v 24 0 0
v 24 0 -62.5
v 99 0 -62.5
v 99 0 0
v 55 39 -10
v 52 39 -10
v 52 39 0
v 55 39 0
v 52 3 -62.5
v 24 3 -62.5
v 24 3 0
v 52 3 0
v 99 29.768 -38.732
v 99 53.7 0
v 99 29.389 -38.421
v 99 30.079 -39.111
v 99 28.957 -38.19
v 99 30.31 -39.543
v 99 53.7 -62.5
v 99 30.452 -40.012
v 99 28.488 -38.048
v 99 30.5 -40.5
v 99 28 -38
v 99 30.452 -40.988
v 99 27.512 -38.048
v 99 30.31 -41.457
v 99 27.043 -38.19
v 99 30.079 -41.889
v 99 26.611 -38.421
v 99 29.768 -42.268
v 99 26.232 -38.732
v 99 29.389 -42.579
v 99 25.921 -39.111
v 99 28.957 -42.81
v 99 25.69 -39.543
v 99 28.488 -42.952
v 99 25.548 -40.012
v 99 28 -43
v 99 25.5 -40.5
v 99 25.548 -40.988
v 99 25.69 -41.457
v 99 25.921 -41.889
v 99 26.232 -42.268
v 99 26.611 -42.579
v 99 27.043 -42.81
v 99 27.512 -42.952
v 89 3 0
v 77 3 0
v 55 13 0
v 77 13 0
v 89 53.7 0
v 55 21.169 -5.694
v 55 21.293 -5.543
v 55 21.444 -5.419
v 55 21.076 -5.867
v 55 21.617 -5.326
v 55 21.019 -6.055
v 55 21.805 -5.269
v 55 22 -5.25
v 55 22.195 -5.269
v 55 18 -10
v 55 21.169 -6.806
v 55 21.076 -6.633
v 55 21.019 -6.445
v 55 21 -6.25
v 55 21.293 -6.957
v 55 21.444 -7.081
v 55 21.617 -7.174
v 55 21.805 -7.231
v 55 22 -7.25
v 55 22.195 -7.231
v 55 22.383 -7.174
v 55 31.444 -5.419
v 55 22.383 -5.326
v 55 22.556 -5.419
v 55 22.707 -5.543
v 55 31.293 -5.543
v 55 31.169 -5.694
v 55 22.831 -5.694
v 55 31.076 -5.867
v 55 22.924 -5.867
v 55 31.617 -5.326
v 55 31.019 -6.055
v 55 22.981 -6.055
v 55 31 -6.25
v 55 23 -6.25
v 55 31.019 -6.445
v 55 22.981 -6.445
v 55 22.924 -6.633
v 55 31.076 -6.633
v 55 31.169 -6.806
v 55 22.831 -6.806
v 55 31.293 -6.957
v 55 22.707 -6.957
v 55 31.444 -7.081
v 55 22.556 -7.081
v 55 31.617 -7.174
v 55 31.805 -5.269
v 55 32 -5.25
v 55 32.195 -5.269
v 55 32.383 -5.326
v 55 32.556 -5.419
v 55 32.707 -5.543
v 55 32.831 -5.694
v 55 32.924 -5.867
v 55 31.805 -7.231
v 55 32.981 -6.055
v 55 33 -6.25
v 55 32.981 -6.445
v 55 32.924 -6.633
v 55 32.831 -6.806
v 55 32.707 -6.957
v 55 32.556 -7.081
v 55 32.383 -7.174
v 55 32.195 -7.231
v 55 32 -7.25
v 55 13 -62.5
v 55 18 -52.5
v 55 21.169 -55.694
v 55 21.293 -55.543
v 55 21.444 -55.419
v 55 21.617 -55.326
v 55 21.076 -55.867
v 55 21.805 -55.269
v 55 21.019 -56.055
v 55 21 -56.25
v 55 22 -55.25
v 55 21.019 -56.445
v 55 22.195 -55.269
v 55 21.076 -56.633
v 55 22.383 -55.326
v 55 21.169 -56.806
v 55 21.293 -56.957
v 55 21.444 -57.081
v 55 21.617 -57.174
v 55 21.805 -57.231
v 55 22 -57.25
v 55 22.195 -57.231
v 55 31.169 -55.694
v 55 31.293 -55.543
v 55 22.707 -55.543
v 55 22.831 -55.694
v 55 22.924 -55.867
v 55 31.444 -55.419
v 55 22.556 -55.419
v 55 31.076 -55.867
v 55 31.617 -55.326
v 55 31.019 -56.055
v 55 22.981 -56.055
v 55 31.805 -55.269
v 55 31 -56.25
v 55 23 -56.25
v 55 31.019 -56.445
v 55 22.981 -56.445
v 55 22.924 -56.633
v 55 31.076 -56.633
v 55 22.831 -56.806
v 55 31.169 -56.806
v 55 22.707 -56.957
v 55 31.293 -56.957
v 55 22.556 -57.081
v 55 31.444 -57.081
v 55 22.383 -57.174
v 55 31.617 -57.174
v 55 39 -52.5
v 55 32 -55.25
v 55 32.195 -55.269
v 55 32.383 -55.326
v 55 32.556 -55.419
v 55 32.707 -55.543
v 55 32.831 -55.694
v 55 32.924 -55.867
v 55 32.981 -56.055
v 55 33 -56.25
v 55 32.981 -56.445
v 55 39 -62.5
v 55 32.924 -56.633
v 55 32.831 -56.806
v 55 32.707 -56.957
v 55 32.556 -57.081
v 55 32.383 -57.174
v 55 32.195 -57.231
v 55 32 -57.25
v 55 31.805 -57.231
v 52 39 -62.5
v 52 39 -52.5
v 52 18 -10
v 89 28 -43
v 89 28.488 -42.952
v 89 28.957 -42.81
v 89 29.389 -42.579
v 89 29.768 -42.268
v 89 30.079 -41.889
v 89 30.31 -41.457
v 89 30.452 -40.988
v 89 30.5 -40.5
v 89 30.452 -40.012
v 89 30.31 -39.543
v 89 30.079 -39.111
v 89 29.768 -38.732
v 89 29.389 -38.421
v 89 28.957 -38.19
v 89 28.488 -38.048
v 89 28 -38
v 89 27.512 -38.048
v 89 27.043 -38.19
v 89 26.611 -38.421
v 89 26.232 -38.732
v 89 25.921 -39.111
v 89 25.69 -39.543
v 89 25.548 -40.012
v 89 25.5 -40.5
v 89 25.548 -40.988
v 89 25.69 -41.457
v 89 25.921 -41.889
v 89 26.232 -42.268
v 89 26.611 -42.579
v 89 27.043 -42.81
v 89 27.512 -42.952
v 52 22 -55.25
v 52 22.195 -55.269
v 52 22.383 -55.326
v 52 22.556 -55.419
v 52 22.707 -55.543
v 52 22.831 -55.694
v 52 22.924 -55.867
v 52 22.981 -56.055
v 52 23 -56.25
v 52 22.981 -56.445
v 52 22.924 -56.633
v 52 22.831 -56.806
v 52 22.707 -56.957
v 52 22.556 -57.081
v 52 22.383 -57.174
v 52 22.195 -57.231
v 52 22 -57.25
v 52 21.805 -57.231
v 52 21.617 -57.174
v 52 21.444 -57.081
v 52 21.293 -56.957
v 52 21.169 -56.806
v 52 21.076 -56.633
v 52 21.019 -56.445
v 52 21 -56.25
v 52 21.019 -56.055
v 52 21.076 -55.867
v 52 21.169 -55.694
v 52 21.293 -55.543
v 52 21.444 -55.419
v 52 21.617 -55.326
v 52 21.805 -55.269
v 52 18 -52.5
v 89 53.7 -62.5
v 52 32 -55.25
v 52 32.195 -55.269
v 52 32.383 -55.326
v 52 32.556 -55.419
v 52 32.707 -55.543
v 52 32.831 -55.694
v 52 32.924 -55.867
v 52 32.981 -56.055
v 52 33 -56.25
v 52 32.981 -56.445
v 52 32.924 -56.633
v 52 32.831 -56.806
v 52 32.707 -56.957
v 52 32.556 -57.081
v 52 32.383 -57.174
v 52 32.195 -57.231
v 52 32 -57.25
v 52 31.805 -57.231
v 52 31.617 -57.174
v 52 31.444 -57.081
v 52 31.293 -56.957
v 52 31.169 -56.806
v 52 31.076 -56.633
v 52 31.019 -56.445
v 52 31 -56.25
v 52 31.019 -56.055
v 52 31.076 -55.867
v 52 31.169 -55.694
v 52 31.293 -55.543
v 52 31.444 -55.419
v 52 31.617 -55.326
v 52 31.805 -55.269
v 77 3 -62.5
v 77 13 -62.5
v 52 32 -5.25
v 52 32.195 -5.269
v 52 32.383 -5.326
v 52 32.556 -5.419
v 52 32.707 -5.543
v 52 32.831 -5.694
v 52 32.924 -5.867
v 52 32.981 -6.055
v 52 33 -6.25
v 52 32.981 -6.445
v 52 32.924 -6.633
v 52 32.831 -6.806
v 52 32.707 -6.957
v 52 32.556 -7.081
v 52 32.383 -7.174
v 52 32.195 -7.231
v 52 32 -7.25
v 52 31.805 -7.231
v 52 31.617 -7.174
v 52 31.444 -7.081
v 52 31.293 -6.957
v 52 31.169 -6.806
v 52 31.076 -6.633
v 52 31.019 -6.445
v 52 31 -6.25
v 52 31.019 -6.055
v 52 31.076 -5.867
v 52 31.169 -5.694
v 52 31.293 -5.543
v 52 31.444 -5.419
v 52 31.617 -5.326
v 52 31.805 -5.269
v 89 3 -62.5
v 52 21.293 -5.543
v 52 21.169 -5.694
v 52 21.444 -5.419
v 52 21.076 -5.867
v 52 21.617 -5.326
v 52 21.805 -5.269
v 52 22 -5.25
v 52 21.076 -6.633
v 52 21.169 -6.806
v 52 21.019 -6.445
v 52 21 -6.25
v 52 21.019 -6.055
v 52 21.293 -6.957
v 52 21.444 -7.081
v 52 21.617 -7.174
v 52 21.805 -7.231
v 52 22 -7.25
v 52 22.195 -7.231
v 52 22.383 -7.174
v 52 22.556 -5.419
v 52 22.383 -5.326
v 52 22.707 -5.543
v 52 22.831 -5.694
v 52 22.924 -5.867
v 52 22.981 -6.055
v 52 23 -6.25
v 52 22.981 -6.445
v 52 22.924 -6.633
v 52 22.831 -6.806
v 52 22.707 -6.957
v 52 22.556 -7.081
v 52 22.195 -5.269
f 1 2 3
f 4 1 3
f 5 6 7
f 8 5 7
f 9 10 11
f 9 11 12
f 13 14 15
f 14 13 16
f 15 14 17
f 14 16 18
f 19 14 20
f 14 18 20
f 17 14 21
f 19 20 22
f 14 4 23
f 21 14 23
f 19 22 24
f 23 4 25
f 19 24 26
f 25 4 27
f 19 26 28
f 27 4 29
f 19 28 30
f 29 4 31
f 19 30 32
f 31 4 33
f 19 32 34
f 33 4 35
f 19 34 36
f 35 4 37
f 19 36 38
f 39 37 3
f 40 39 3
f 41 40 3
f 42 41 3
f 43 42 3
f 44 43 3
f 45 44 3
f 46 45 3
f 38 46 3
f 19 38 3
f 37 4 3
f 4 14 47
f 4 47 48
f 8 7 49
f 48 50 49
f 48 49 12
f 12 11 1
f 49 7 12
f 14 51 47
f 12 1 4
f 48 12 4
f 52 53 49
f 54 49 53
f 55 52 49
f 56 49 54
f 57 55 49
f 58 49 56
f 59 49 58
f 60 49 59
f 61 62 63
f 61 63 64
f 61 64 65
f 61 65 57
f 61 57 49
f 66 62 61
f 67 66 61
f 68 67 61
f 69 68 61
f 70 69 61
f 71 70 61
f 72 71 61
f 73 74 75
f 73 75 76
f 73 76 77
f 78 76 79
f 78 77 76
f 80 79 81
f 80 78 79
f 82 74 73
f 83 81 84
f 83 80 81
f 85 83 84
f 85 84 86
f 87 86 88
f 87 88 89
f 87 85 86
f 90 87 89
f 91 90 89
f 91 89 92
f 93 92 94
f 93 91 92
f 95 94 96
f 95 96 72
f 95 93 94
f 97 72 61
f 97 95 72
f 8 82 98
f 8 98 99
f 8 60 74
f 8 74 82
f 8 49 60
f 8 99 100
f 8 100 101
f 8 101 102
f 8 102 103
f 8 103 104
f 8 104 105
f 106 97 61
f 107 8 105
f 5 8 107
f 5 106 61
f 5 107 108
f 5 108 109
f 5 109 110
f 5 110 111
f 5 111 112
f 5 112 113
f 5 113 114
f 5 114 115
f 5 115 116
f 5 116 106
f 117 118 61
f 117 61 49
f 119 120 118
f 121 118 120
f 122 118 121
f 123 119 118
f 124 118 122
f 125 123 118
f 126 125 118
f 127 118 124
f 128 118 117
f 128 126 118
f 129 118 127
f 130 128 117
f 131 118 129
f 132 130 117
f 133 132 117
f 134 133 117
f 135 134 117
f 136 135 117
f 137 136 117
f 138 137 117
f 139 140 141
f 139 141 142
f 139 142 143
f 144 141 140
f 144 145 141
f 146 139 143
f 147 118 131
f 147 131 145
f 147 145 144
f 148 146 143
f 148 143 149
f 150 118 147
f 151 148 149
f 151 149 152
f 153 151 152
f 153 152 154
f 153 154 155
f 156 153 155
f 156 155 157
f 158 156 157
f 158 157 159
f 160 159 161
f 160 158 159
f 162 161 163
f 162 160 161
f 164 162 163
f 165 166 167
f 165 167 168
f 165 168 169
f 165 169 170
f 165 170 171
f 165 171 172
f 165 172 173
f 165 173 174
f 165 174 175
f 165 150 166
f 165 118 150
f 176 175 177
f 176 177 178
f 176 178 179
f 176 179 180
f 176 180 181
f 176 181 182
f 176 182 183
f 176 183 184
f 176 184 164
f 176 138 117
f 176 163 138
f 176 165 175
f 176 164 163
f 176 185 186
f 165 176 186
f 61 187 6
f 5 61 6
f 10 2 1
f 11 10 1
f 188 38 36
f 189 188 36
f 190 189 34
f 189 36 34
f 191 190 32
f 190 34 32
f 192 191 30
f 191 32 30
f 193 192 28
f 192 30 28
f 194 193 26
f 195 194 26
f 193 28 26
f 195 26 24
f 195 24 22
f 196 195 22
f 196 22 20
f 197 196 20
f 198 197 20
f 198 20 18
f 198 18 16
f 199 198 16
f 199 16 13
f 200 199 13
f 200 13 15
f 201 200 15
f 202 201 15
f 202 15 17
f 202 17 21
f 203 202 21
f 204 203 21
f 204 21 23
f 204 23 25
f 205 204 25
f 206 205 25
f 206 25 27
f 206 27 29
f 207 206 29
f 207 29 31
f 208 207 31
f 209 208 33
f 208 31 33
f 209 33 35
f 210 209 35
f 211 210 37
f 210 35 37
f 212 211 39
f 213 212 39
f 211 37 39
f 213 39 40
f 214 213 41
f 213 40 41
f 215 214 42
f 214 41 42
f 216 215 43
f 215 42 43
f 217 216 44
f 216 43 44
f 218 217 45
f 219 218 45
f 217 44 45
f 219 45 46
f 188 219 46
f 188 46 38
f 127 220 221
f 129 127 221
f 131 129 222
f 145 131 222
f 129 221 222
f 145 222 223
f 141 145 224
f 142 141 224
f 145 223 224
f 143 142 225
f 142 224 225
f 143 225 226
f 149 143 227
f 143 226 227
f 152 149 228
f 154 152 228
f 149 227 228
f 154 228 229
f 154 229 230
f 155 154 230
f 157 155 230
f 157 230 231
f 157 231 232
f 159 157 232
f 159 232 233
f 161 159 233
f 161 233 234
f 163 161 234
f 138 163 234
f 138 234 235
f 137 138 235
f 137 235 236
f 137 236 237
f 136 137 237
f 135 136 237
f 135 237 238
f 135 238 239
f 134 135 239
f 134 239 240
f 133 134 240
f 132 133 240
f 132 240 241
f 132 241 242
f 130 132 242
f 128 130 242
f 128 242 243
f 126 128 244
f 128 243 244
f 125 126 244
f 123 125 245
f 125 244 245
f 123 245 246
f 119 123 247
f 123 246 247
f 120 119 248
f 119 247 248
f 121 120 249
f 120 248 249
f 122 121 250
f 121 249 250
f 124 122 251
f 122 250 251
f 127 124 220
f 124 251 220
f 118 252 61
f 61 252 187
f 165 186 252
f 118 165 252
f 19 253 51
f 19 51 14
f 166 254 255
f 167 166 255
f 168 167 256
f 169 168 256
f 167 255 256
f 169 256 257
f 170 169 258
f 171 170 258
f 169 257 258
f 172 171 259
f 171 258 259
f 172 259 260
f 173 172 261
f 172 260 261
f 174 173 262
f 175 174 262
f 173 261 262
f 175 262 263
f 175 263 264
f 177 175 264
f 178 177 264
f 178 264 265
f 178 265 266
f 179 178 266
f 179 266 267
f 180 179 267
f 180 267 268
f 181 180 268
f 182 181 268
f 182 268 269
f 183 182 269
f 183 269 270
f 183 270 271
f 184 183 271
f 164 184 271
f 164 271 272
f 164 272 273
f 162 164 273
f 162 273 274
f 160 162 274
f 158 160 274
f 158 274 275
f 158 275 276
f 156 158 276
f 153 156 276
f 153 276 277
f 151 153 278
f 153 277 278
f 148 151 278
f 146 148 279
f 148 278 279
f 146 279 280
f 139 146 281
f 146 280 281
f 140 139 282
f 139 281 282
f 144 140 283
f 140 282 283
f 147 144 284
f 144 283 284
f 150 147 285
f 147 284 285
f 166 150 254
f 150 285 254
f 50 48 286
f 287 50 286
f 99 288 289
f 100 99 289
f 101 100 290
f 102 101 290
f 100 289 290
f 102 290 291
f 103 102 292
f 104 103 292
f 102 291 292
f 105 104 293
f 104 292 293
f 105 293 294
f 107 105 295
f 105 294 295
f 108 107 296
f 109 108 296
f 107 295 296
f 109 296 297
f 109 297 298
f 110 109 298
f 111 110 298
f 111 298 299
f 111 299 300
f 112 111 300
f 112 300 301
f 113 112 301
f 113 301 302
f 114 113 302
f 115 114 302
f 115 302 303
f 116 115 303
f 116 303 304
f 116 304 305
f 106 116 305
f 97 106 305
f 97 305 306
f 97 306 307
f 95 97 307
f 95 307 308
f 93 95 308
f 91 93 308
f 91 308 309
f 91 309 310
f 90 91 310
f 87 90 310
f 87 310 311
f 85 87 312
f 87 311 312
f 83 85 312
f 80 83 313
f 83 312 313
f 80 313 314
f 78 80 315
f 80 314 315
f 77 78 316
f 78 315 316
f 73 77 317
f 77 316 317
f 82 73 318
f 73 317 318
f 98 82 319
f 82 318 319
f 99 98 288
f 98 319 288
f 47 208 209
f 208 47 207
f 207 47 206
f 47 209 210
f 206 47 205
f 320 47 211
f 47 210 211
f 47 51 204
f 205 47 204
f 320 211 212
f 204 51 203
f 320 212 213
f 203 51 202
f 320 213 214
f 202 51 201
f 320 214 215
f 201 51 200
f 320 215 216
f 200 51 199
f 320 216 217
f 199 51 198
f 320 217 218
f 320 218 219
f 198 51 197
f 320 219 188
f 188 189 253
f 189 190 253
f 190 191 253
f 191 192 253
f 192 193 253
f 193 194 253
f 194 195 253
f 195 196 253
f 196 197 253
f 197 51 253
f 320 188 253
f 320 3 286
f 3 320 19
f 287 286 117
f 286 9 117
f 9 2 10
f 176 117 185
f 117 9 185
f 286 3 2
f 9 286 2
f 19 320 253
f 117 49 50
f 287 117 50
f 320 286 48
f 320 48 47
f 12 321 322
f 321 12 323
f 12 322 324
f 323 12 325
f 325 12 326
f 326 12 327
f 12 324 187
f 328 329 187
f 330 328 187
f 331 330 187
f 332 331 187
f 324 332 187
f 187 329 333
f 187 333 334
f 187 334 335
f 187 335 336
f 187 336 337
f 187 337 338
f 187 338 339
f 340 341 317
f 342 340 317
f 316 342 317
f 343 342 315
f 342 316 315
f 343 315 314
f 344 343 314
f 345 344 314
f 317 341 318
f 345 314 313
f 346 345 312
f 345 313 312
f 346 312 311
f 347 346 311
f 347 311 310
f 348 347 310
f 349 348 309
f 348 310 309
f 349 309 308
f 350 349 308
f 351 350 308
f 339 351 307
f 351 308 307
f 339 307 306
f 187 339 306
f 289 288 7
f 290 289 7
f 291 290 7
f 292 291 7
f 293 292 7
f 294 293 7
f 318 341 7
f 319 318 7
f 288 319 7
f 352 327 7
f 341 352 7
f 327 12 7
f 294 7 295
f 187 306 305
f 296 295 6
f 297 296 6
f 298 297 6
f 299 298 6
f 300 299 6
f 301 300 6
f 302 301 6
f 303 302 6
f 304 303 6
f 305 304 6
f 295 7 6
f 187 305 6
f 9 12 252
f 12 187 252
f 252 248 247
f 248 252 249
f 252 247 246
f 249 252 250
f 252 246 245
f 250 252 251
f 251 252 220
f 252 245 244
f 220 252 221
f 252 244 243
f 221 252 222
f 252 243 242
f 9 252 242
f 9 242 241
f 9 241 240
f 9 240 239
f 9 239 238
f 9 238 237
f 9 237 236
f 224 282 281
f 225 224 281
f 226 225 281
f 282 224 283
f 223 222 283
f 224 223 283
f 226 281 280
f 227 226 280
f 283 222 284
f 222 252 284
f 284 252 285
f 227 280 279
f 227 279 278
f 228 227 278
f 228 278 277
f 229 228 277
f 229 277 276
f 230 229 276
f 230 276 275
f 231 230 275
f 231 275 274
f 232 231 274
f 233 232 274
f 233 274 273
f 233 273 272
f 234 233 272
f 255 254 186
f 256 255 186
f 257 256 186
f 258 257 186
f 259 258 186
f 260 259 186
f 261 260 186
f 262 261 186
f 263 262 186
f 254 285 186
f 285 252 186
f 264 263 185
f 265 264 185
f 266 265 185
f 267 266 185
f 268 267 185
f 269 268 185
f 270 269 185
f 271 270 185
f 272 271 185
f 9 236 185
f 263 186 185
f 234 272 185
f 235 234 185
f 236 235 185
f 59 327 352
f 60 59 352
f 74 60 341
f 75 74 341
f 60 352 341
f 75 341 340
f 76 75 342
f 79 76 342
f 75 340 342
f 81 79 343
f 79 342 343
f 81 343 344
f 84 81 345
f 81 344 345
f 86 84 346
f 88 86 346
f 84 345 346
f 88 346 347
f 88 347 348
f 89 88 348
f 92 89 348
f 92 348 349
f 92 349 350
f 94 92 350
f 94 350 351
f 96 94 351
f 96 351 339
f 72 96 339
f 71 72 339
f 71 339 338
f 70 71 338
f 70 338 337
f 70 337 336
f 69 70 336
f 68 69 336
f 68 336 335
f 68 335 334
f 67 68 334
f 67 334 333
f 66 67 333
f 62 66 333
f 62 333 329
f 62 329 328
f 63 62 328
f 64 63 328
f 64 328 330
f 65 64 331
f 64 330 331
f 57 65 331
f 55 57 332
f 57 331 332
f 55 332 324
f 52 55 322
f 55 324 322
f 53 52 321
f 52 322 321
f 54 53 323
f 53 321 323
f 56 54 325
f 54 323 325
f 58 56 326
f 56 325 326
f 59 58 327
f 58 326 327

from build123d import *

# Parameters (mm, degrees)
SKETCH1_W           = 99
SKETCH1_H           = 62.5
BOSS_EXTRUDE1_DEPTH = 53.7
SKETCH2_W           = 79
SKETCH2_H           = 62.5
CUT_EXTRUDE1_DEPTH  = 50.7
SKETCH3_W           = 25
SKETCH3_H           = 62.5
BOSS_EXTRUDE2_DEPTH = 10
BOSS_EXTRUDE4_DEPTH = 3
SKETCH5_W           = 24
SKETCH5_H           = 62.5
CUT_EXTRUDE3_DEPTH  = 72
CUT_EXTRUDE4_REACH  = 96.863
SKETCH6_R           = 1
SKETCH7_R           = 2.5
CUT_EXTRUDE5_DEPTH  = 72


with BuildPart() as part:
    # Sketch1 → Boss-Extrude1 (new body)
    with BuildSketch(Plane(origin=(0, 0, 0), x_dir=(1, 0, 0), z_dir=(0, 1, 0))):
        with Locations((49.5, 31.25)):
            Rectangle(SKETCH1_W, SKETCH1_H)
    extrude(amount=BOSS_EXTRUDE1_DEPTH)

    # Sketch2 → Cut-Extrude1 (cut)
    with BuildSketch(Plane(origin=(0, 53.7, 0), x_dir=(1, 0, 0), z_dir=(0, 1, 0))):
        with Locations((49.5, 31.25)):
            Rectangle(SKETCH2_W, SKETCH2_H)
    extrude(amount=-CUT_EXTRUDE1_DEPTH, mode=Mode.SUBTRACT)

    # Sketch3 → Boss-Extrude2 (add)
    with BuildSketch(Plane(origin=(0, 3, 0), x_dir=(1, 0, 0), z_dir=(0, 1, 0))):
        with Locations((64.5, 31.25)):
            Rectangle(SKETCH3_W, SKETCH3_H)
    extrude(amount=BOSS_EXTRUDE2_DEPTH)

    # Sketch4 → Boss-Extrude4 (add)
    with BuildSketch(Plane.ZY.offset(-52)):
        Polygon((-62.5, 13), (-62.5, 39), (-52.5, 39), (-52.5, 18), (-10, 18), (-10, 39), (0, 39), (0, 13), align=None)
    extrude(amount=-BOSS_EXTRUDE4_DEPTH)

    # Sketch5 → Cut-Extrude3 (cut)
    with BuildSketch(Plane.XZ):
        with Locations((12, -31.25)):
            Rectangle(SKETCH5_W, SKETCH5_H)
    extrude(amount=-CUT_EXTRUDE3_DEPTH, mode=Mode.SUBTRACT)

    # Sketch6 → Cut-Extrude4 (cut, up to next)
    with BuildSketch(Plane.ZY.offset(-52), mode=Mode.PRIVATE) as cut_extrude4_sk1:
        with Locations((-56.25, 32)):
            Circle(SKETCH6_R)
    cut_extrude4_tool1 = extrude(cut_extrude4_sk1.sketch, amount=-CUT_EXTRUDE4_REACH, mode=Mode.PRIVATE) & part.part
    # Sketch6 → Cut-Extrude4 (cut, up to next)
    with BuildSketch(Plane.ZY.offset(-52), mode=Mode.PRIVATE) as cut_extrude4_sk2:
        with Locations((-56.25, 22)):
            Circle(SKETCH6_R)
    cut_extrude4_tool2 = extrude(cut_extrude4_sk2.sketch, amount=-CUT_EXTRUDE4_REACH, mode=Mode.PRIVATE) & part.part
    # Sketch6 → Cut-Extrude4 (cut, up to next)
    with BuildSketch(Plane.ZY.offset(-52), mode=Mode.PRIVATE) as cut_extrude4_sk3:
        with Locations((-6.25, 22)):
            Circle(SKETCH6_R)
    cut_extrude4_tool3 = extrude(cut_extrude4_sk3.sketch, amount=-CUT_EXTRUDE4_REACH, mode=Mode.PRIVATE) & part.part
    # Sketch6 → Cut-Extrude4 (cut, up to next)
    with BuildSketch(Plane.ZY.offset(-52), mode=Mode.PRIVATE) as cut_extrude4_sk4:
        with Locations((-6.25, 32)):
            Circle(SKETCH6_R)
    cut_extrude4_tool4 = extrude(cut_extrude4_sk4.sketch, amount=-CUT_EXTRUDE4_REACH, mode=Mode.PRIVATE) & part.part
    add(cut_extrude4_tool1.solids().sort_by_distance((52, 32, -56.25))[0], mode=Mode.SUBTRACT)
    add(cut_extrude4_tool2.solids().sort_by_distance((52, 22, -56.25))[0], mode=Mode.SUBTRACT)
    add(cut_extrude4_tool3.solids().sort_by_distance((52, 22, -6.25))[0], mode=Mode.SUBTRACT)
    add(cut_extrude4_tool4.solids().sort_by_distance((52, 32, -6.25))[0], mode=Mode.SUBTRACT)

    # Sketch7 → Cut-Extrude5 (cut)
    with BuildSketch(Plane(origin=(99, 0, 0), x_dir=(0, 0, -1), z_dir=(1, 0, 0))):
        with Locations((40.5, 28)):
            Circle(SKETCH7_R)
    extrude(amount=-CUT_EXTRUDE5_DEPTH, mode=Mode.SUBTRACT)


solid = part.part
